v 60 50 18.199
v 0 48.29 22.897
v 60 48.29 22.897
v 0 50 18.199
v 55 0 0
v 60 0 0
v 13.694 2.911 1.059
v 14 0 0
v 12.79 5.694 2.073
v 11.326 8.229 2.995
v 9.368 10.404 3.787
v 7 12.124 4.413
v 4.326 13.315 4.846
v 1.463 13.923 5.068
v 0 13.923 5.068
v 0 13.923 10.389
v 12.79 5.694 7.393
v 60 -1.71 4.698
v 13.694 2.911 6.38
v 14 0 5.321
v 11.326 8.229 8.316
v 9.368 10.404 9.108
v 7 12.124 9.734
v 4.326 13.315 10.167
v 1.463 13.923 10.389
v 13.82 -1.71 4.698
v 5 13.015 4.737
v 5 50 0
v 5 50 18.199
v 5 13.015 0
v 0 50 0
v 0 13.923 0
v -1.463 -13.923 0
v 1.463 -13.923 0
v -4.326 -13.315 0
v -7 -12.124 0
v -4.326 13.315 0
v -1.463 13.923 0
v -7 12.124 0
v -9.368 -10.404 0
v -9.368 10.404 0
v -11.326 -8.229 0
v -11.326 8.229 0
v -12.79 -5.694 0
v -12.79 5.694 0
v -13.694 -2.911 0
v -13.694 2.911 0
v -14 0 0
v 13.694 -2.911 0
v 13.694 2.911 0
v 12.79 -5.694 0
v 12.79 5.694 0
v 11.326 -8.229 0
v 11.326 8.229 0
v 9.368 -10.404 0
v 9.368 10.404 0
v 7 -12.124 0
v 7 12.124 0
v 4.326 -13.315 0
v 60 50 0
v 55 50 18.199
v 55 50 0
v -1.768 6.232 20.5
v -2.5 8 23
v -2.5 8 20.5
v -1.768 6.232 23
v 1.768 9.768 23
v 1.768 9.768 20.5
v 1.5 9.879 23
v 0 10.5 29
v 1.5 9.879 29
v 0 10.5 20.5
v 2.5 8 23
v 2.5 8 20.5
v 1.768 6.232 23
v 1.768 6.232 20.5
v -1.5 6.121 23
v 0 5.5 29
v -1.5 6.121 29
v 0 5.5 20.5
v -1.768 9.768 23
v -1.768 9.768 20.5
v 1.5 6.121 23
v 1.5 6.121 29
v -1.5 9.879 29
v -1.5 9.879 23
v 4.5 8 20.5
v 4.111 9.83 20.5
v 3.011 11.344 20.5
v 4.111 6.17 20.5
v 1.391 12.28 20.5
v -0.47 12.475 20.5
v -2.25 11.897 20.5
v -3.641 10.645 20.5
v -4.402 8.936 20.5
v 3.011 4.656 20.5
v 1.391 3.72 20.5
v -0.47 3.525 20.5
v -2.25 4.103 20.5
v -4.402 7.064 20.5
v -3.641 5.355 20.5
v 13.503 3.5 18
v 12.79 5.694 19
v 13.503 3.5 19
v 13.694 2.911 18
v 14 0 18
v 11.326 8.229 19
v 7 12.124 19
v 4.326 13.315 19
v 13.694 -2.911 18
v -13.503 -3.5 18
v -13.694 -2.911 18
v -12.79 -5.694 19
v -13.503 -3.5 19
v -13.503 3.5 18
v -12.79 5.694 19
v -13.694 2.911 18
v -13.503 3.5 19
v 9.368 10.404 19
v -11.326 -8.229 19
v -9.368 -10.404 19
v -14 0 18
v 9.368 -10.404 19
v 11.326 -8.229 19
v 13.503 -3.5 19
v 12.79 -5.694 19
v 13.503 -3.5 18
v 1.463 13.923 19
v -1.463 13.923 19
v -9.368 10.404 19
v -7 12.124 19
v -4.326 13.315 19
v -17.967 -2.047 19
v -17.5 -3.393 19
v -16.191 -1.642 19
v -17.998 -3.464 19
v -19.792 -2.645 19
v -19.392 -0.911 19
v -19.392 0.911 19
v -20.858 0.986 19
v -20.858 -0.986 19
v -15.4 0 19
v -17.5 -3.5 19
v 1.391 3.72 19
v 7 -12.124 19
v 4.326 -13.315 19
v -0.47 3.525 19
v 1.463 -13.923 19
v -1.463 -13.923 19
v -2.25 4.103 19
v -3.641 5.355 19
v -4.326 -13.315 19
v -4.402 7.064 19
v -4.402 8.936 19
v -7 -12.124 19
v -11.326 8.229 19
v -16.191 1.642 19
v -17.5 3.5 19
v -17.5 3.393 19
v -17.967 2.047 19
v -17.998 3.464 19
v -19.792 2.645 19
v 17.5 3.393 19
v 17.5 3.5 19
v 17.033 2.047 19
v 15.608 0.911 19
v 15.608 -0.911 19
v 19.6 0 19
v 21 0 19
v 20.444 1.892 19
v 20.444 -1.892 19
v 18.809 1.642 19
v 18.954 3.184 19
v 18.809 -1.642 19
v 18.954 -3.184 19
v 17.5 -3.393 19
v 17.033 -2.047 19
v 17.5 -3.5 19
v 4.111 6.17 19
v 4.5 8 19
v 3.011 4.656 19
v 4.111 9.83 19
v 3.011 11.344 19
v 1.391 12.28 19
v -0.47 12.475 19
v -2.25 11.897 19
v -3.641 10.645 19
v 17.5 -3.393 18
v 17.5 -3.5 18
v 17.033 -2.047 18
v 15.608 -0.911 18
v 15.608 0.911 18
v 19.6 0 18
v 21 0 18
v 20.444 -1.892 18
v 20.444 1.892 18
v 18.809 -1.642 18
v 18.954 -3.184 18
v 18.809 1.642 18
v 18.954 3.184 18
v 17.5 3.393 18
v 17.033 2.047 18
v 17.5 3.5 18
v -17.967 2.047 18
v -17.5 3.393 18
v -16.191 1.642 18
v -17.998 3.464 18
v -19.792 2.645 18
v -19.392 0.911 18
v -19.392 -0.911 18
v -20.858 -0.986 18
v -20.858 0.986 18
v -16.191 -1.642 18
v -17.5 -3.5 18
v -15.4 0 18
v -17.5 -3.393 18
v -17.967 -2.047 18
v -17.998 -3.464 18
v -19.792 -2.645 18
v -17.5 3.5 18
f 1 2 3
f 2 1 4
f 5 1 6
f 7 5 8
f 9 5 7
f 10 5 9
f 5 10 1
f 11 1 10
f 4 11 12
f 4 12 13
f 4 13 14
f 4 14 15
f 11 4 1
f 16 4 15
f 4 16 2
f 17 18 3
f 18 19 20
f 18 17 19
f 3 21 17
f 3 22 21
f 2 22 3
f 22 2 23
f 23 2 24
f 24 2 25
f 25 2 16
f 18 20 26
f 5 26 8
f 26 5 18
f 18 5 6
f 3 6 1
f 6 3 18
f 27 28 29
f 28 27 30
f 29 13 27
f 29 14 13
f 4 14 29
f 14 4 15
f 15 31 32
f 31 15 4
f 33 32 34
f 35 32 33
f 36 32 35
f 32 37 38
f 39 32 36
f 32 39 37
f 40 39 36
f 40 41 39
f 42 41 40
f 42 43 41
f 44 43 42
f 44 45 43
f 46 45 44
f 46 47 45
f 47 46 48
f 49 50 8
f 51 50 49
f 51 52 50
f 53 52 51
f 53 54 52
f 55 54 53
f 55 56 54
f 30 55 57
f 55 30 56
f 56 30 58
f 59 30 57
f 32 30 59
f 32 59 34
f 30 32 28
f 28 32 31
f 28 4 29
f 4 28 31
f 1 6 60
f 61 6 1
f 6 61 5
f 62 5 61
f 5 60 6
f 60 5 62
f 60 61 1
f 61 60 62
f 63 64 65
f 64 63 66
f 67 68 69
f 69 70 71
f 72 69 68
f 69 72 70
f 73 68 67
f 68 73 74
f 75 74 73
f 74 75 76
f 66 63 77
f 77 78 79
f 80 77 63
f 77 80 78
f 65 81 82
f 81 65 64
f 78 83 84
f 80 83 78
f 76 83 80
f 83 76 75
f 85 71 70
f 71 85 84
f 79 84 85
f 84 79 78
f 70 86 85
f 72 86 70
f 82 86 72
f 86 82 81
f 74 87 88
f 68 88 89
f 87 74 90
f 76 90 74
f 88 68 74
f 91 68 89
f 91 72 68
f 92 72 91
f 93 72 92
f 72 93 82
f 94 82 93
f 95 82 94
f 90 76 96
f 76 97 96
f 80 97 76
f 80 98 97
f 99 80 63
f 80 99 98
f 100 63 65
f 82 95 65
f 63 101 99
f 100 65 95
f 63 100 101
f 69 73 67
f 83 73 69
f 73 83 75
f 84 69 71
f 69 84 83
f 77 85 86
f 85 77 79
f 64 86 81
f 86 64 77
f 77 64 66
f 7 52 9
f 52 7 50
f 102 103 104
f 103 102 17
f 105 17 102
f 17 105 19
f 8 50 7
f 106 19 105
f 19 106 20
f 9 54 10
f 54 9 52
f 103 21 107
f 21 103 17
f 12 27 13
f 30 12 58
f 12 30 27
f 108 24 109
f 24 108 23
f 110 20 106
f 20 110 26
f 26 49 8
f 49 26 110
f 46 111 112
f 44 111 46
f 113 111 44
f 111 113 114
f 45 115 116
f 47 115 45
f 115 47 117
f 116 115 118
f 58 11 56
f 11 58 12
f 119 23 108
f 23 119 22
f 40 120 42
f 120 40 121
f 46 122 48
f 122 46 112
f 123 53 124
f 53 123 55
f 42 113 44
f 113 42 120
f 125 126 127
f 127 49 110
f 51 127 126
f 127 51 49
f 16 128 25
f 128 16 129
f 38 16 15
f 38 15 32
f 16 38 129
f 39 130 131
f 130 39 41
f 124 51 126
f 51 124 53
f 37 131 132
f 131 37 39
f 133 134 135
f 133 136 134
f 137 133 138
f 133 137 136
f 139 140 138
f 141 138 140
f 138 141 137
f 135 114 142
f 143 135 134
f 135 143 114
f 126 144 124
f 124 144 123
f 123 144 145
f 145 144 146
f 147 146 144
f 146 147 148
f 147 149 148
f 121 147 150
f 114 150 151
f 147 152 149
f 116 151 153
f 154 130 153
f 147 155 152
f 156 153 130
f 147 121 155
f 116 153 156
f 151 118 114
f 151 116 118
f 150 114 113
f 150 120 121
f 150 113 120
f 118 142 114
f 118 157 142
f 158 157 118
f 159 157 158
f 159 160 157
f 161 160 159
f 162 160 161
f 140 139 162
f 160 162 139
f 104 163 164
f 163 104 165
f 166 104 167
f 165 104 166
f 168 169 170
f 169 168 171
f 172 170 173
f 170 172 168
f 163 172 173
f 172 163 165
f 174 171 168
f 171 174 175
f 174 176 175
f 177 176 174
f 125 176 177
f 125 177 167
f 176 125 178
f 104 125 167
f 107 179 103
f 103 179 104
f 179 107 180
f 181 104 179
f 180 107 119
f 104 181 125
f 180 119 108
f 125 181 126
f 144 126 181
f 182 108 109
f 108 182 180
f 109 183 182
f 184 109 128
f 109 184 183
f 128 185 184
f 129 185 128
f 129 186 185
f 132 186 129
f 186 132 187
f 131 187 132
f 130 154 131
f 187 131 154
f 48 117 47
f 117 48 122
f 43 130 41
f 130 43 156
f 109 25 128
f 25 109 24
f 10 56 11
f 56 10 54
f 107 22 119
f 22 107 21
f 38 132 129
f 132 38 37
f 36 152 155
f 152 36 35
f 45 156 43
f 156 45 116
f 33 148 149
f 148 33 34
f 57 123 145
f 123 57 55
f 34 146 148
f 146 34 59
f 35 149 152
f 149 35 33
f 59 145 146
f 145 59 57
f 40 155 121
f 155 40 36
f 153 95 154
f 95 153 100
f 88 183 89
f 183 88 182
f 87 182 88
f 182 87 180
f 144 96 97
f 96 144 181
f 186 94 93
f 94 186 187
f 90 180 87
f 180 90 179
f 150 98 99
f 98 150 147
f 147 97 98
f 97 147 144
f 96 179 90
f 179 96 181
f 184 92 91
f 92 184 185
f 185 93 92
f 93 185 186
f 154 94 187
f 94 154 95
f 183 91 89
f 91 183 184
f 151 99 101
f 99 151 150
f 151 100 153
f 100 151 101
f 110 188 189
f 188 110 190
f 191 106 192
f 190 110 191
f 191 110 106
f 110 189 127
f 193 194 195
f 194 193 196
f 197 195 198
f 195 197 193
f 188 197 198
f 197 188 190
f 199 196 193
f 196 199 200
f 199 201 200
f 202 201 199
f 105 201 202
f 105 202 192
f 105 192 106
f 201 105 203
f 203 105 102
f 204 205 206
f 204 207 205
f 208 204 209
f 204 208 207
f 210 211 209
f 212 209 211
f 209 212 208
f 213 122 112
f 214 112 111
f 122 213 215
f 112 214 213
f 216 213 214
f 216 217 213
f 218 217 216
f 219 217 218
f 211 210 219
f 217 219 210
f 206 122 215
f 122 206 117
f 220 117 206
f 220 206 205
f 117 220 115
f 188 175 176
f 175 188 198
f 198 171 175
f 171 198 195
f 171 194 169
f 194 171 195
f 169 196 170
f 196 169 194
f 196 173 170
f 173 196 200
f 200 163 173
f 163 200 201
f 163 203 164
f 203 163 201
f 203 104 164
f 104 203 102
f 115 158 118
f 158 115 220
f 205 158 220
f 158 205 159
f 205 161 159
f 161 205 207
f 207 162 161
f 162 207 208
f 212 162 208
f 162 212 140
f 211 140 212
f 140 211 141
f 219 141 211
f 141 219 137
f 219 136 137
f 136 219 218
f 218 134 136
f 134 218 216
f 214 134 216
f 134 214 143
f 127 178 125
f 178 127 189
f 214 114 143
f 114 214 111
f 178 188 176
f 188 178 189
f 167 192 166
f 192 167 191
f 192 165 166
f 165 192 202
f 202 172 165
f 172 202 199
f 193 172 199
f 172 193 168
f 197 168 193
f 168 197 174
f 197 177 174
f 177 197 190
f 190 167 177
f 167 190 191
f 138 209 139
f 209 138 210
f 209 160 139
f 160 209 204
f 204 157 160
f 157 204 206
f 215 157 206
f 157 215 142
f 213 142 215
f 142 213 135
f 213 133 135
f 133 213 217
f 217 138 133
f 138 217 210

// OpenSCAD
acrylic_thickness = 5;
margin = 10;

pen_angle = 20;
wedge_width = 60;
wedge_length = 50;


wedge_height = wedge_length*tan(pen_angle);


module extrude(){
    linear_extrude(acrylic_thickness) children(0);
}

module wedge(){
    polygon([[0,0],[wedge_length,0],[0,wedge_height]]);
}

module extruded_wedge(){
    translate([0,wedge_length,0]) 
    rotate(-90,[0,1,0]) 
    rotate(-90,[0,0,1]) 
    extrude() wedge();
}

module ramp_top(){
    square([wedge_width, wedge_length/cos(pen_angle)]);
}

module ramp(){
    rotate(pen_angle, [1,0,0]) {
        extrude() ramp_top();
    }
    translate([acrylic_thickness,0,0]) extruded_wedge();
    translate([wedge_width,0,0]) extruded_wedge();
}

module motor(){
    cylinder(19, 14, 14, centered=true);
    translate([0,8,19]) cylinder(1.5, 4.5, 4.5, centered=true);
    translate([0,8,20.5]){
        difference(){
            cylinder(8.5, 2.5, 2.5);
            translate([1.5,-5,2.5]) cube([10,10,10]);
            translate([-11.5,-5,2.5]) cube([10,10,10]);
        }
    }
    
    translate([0, 0, 18])linear_extrude(1){
        difference(){
            union(){
                square([35, 7], center=true);
                translate([17.5,0]) circle(3.5);
                translate([-17.5,0]) circle(3.5);
            }
            translate([17.5,0]) circle(2.1);
            translate([-17.5,0]) circle(2.1);
        }
    }
        
}


module laser(){
    wedge();
    translate([wedge_length,wedge_height+margin]) rotate(180,[0,0,1]) wedge();
    translate([wedge_length+margin, 0]) ramp_top();
    
}

ramp();
//laser();
motor();
